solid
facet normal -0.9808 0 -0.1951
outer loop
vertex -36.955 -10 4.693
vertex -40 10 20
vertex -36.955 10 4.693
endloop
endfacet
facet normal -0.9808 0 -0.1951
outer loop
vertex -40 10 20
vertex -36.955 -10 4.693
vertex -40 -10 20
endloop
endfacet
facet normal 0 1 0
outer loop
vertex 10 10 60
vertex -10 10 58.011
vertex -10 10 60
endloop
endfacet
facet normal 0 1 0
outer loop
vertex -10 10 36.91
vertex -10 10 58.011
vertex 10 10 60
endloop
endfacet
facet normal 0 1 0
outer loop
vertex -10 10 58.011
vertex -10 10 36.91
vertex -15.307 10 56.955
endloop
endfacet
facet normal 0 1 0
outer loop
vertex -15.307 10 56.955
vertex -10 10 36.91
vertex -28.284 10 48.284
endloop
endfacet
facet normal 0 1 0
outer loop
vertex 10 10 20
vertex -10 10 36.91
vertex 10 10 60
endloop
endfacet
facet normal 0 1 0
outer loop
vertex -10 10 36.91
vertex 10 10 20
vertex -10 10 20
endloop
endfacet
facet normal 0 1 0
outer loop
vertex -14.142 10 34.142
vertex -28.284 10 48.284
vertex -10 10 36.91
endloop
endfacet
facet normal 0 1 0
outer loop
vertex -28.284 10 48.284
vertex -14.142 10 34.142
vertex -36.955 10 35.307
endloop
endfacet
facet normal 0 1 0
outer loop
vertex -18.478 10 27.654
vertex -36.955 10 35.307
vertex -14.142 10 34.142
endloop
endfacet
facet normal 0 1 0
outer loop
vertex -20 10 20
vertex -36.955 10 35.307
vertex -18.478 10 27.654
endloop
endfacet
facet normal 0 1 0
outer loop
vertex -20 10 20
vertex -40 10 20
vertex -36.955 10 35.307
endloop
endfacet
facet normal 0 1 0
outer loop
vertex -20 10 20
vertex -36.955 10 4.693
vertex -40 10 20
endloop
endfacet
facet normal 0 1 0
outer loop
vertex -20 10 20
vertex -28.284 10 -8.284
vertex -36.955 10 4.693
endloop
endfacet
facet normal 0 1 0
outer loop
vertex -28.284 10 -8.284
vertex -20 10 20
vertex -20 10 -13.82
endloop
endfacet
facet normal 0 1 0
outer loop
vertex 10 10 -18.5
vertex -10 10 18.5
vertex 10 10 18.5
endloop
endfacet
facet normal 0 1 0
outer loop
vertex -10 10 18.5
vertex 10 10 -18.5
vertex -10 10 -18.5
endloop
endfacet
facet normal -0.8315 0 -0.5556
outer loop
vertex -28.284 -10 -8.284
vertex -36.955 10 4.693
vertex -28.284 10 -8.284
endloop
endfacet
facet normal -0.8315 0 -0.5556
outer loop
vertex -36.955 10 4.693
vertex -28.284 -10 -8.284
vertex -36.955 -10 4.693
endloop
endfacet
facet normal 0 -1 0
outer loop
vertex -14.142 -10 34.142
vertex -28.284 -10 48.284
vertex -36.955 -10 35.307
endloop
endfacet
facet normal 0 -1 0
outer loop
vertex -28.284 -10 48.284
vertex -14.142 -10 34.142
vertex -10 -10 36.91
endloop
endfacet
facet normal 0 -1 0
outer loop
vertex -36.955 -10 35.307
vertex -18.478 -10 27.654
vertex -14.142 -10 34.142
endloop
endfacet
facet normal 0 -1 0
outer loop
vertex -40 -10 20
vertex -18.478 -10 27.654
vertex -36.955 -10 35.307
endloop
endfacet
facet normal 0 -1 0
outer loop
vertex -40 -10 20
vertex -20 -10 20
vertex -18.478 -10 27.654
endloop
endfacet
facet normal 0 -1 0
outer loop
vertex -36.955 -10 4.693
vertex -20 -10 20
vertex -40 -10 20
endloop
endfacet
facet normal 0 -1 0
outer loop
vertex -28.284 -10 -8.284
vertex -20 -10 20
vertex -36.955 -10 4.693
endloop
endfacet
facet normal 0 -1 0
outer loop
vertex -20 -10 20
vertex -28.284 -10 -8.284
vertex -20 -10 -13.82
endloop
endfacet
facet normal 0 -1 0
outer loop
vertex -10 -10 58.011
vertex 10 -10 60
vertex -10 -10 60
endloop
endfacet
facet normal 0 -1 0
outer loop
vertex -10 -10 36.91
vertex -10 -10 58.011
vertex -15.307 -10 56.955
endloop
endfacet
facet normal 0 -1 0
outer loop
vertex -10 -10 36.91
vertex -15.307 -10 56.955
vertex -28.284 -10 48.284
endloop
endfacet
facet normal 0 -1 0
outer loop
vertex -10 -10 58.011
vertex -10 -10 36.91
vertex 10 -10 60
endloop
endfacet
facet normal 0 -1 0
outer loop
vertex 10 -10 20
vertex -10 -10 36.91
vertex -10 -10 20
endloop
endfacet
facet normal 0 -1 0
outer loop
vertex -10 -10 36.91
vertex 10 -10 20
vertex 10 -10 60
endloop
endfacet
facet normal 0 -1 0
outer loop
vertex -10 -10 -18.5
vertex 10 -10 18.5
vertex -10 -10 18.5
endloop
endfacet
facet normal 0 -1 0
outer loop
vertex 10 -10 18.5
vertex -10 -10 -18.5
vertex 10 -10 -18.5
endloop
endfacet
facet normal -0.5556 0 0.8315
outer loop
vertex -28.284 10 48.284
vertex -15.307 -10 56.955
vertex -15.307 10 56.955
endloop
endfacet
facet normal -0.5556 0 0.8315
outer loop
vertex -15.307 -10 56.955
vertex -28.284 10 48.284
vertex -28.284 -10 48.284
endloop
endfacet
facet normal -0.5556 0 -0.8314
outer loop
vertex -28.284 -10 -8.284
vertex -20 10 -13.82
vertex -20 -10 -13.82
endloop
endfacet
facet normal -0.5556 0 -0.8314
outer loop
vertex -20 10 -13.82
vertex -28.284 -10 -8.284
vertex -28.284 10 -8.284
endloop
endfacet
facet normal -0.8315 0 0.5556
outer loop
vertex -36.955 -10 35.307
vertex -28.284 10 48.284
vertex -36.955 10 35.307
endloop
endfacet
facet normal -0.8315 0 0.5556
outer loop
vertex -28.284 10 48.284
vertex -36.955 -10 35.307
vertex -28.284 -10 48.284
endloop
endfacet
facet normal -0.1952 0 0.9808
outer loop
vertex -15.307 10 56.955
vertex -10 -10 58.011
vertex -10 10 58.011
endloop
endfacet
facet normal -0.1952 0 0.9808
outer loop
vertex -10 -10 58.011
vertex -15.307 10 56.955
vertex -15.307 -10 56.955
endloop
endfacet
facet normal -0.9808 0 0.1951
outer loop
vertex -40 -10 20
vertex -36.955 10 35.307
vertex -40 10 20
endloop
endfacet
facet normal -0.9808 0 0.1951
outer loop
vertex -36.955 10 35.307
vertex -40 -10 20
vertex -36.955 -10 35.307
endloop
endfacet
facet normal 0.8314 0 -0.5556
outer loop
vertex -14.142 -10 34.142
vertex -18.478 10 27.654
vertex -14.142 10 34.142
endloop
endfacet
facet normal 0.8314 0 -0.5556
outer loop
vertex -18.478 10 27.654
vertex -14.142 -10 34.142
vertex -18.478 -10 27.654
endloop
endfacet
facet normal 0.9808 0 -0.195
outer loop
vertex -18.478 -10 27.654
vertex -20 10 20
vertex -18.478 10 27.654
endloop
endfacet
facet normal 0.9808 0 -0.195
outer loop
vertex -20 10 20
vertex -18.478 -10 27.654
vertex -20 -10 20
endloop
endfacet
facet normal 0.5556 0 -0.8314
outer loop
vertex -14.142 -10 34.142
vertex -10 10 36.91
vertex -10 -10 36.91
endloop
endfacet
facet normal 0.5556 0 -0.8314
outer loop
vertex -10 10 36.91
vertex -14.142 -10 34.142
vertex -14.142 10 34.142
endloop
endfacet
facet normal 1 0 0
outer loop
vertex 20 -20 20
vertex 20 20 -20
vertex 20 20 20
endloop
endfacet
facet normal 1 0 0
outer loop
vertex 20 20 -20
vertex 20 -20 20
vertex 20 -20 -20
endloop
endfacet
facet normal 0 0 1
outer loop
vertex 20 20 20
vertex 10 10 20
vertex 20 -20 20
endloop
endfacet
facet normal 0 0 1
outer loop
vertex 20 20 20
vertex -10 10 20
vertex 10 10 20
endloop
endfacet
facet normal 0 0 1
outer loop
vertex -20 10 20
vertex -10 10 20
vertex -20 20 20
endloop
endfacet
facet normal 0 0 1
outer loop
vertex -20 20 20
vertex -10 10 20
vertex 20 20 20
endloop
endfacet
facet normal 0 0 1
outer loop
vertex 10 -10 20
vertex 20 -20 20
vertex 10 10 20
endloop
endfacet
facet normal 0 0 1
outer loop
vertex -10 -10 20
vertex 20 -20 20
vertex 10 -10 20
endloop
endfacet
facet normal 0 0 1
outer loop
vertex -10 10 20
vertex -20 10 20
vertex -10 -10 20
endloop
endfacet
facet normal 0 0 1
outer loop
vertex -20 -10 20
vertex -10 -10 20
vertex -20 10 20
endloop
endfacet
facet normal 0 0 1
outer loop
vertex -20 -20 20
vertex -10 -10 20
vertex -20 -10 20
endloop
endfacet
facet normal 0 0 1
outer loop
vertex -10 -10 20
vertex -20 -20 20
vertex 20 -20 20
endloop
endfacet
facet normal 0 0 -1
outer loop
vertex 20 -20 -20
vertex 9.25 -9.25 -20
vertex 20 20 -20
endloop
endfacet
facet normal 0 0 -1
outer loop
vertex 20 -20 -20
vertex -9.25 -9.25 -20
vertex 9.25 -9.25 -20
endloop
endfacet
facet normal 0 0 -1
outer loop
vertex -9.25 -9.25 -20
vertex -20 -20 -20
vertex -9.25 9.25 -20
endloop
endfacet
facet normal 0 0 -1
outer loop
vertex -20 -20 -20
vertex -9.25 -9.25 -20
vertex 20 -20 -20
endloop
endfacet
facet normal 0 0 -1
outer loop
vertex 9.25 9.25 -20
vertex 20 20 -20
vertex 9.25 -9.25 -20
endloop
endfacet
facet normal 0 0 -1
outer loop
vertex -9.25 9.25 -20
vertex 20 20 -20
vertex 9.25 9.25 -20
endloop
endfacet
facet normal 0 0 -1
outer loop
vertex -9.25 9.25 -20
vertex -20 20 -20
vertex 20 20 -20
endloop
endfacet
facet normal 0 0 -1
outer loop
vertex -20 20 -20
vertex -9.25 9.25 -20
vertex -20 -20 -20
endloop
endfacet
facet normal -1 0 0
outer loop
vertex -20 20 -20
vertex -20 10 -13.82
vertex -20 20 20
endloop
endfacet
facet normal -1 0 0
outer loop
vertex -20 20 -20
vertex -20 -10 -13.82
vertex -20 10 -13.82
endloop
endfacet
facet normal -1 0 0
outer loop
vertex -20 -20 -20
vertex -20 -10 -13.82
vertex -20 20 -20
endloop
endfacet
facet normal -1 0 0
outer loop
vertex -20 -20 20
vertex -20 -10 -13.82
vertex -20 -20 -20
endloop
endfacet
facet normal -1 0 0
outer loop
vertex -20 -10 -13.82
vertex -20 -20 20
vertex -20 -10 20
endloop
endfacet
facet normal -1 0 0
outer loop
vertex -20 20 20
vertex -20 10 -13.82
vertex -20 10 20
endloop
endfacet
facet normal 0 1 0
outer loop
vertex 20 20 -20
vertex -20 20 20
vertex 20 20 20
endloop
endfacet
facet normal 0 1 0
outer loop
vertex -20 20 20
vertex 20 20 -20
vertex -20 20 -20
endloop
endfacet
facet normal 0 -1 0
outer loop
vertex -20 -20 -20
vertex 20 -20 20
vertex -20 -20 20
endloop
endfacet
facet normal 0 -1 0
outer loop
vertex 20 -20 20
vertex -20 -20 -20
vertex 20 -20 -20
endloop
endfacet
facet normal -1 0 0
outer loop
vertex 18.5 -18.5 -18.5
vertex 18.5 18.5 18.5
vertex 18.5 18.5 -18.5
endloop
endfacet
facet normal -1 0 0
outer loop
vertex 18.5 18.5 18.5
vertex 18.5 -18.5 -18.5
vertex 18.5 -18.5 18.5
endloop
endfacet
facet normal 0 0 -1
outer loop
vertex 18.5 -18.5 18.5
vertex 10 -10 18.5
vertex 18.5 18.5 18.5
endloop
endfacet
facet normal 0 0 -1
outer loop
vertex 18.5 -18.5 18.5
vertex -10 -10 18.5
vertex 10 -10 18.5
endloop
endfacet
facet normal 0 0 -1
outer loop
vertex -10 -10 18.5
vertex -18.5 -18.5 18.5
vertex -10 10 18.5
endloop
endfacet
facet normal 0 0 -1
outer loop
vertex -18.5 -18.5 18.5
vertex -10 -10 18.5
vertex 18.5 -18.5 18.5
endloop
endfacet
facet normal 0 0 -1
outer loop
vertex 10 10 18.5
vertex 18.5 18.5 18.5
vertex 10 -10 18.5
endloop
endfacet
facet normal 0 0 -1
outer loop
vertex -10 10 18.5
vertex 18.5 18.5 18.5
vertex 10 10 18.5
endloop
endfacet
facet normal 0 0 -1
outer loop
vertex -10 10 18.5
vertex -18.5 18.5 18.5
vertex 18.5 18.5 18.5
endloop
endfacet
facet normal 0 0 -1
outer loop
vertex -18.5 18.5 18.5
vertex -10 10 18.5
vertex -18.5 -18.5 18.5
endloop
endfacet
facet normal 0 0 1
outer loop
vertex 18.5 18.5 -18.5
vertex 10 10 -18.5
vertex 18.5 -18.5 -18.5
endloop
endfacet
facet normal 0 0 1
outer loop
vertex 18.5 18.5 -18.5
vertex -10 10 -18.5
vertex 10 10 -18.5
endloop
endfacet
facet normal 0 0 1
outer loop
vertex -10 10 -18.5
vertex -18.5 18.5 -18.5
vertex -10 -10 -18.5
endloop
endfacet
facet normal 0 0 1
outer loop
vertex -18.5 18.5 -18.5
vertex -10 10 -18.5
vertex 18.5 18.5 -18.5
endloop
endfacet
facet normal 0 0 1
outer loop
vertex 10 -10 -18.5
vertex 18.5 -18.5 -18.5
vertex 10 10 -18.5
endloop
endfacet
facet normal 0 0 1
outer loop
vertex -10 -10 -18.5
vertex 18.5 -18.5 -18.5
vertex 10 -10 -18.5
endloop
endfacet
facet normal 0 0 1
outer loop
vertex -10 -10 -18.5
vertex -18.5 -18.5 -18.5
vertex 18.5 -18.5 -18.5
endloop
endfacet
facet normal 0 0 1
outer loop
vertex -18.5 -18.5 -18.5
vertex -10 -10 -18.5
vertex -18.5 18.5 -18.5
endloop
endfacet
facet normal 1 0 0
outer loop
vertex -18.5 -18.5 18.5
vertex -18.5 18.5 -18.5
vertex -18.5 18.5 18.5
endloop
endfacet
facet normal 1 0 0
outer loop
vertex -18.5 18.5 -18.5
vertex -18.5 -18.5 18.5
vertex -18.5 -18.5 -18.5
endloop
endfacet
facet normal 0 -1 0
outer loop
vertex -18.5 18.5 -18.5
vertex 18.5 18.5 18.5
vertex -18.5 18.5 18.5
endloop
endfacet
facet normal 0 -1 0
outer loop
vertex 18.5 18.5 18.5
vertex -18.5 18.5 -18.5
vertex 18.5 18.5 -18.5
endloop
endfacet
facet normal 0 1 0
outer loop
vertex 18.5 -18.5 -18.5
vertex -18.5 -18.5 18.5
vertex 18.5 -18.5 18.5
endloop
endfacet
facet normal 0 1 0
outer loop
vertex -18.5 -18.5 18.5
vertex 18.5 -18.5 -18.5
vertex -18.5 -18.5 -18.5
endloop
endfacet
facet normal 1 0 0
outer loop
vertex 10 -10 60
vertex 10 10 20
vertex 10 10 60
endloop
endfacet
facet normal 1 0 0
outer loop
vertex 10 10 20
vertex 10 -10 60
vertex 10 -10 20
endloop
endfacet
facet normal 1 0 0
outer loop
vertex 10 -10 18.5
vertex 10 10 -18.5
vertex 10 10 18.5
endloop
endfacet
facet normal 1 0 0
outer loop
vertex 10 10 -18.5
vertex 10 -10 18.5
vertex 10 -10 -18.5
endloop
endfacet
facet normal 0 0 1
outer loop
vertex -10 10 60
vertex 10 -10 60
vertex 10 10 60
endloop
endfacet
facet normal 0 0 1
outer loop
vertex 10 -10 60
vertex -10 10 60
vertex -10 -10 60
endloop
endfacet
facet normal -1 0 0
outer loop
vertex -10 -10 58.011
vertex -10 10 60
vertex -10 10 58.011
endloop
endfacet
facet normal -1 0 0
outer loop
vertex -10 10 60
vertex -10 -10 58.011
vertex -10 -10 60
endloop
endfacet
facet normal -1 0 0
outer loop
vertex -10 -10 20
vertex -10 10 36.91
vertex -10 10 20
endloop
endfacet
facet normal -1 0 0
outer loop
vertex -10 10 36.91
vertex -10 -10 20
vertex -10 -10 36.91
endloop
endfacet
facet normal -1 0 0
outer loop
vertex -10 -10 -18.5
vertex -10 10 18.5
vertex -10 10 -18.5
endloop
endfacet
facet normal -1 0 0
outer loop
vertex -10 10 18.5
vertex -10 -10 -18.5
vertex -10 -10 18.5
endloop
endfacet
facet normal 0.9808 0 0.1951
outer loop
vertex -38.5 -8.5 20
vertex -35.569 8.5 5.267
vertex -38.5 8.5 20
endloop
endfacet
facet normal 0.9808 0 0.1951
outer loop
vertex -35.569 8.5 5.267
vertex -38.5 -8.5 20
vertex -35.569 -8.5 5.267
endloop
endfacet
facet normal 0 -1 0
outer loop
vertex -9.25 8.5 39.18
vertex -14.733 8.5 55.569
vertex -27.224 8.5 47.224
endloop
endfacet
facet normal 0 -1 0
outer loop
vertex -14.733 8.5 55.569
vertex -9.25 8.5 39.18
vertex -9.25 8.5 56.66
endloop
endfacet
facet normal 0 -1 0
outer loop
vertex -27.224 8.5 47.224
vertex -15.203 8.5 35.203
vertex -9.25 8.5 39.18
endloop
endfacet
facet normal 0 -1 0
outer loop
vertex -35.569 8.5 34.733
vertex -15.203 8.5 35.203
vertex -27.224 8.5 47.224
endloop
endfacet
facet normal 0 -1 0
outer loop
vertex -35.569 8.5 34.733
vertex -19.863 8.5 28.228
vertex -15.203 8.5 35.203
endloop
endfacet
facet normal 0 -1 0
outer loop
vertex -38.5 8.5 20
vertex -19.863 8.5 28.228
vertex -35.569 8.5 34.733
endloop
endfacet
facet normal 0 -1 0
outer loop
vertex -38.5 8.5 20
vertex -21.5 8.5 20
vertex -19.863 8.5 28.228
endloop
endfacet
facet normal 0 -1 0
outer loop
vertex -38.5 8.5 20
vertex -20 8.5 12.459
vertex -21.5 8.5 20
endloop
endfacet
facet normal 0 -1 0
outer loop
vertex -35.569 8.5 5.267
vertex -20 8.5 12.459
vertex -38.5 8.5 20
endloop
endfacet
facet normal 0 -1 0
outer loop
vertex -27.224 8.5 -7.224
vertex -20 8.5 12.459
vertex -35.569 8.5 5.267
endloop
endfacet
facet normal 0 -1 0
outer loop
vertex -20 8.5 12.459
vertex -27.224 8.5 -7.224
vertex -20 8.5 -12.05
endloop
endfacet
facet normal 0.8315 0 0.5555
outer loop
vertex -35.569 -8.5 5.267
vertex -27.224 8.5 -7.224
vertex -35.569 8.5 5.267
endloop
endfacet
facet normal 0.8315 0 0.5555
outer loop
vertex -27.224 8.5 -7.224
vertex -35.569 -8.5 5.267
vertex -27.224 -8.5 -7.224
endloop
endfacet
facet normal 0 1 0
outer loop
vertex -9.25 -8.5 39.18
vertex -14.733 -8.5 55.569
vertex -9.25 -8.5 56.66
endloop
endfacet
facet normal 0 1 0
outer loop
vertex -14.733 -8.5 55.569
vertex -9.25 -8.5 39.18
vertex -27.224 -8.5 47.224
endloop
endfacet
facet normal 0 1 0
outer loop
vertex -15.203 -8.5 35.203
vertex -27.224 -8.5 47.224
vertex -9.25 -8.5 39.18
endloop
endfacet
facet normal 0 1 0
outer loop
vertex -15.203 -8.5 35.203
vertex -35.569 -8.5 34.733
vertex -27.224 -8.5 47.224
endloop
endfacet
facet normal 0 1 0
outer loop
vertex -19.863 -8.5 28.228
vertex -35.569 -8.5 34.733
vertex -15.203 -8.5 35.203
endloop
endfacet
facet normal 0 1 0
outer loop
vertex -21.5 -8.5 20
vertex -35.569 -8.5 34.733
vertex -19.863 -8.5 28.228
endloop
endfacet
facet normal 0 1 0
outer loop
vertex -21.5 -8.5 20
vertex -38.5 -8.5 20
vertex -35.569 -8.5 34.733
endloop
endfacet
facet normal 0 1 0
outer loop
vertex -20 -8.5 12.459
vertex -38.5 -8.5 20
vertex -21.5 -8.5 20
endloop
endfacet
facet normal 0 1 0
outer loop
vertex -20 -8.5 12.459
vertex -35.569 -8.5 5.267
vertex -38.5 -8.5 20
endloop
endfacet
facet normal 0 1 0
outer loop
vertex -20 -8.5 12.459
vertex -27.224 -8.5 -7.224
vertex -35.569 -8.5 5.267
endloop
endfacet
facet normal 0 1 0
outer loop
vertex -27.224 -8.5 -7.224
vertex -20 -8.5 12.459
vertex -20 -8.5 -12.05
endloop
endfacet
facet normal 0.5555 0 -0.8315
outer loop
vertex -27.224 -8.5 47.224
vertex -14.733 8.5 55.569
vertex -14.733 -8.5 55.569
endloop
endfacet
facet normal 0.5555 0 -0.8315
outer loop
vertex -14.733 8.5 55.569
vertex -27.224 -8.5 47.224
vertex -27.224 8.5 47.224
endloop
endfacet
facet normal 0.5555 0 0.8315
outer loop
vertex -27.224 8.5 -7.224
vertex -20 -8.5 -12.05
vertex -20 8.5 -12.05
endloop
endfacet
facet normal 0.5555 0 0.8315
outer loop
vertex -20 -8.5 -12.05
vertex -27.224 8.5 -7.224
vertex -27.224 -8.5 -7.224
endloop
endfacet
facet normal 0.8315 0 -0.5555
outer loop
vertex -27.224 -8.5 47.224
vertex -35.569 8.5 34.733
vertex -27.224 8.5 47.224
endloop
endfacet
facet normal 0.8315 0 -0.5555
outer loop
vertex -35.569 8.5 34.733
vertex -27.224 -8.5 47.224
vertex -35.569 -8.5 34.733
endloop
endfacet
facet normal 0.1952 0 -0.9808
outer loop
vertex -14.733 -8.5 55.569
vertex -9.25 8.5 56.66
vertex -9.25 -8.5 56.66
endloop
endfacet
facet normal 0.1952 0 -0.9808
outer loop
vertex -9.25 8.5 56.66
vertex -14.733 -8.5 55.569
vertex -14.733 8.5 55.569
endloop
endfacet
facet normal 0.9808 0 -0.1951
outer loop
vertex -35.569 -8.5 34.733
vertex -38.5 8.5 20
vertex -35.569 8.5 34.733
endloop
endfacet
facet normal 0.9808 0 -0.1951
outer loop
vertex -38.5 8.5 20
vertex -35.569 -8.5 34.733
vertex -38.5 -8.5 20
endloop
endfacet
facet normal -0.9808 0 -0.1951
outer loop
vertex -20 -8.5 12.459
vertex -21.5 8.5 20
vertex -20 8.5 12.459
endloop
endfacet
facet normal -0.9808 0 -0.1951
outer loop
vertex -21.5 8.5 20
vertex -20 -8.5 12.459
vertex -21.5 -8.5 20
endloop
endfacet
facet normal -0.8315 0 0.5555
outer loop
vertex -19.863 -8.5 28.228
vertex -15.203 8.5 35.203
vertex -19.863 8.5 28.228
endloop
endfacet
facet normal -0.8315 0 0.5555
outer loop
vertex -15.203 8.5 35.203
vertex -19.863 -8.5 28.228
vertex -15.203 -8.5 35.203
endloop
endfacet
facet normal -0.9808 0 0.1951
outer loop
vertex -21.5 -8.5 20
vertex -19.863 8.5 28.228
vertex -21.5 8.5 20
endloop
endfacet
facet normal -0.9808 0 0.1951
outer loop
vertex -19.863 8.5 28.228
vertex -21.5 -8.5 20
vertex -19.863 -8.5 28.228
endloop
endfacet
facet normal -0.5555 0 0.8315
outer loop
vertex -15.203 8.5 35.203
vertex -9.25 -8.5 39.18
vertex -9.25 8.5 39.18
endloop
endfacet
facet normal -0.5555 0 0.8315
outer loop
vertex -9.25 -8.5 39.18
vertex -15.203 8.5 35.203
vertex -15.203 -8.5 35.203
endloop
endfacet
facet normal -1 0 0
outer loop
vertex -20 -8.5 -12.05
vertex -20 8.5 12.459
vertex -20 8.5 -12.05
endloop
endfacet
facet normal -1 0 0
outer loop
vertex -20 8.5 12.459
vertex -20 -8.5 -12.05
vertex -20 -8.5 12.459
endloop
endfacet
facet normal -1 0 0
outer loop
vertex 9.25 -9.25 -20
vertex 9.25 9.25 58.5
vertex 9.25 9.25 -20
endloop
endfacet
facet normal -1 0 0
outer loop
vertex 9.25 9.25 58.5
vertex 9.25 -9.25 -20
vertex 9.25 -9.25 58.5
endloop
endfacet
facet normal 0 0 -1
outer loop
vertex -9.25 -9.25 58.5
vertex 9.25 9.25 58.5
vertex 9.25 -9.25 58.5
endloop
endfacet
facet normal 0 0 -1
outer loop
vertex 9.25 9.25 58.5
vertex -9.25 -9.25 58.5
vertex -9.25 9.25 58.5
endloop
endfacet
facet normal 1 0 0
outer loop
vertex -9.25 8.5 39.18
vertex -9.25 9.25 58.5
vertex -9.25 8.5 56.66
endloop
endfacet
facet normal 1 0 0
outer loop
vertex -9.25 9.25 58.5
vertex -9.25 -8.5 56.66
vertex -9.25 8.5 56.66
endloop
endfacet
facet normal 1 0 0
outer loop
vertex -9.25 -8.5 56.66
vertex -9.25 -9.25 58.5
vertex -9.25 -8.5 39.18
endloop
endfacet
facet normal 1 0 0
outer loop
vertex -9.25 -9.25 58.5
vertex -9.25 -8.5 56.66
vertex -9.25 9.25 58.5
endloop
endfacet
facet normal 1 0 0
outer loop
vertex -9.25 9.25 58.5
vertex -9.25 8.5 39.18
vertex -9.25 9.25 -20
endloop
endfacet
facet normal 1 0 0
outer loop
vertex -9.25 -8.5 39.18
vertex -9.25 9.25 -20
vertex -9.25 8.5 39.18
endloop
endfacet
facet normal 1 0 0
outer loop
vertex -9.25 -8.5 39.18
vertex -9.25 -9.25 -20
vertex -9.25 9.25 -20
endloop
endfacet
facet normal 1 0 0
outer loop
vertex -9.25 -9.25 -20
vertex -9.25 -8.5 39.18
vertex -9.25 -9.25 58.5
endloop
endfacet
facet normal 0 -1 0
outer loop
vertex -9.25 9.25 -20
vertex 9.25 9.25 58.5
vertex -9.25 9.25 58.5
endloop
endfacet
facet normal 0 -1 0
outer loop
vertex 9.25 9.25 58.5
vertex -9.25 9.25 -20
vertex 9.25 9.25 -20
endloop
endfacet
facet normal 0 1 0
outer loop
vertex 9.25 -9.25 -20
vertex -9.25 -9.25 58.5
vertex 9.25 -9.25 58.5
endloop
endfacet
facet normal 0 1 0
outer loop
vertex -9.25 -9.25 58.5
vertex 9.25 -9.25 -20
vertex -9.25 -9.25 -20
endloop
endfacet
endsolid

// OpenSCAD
c = 40;   // Cube size
u = 20;   // Tube size
t = 1.5;  // Thickness
fn = 16;    // Facets

difference()
  {
  union()
    {
    difference()
      {
      union()
        {
        //  Main block/body of bottle
        cube(c,center=true);  
        difference()
          {
          //  Thin wide cylinder, turned on its side to act as handle
          translate([0,0,c/2]) rotate([90,0,0]) cylinder(h=u,r=c,$fn=fn, center=true);
          //  Cut out so that it is kind of a donut shape
          translate([0,0,c/2]) rotate([90,0,0]) cylinder(h=u+1,r=c-u,$fn=fn, center=true);
          //  Cut in half, vertically so that it is essentially a large "C" 
          translate([c+1,0,c/2]) cube(c*2+2, center=true);
          }
        }
      //  Cut out of main block/body
      cube(c-t*2,center=true);
      }
    //  Tall thin neck to block/body - needs to run through middle of bottle
    translate([0,0,c/2]) cube([u,u,c*2],center=true);
    }
  //  Need to include cutout for interior of neck
  translate([0,0,c/2-t]) cube([u-t,u-t,c*2],center=true);
  //  Need to include cutout for interior of handle
  difference()
    {
    //  Thin wide cylinder, turned on its side to act as handle
    translate([0,0,c/2]) rotate([90,0,0]) cylinder(h=u-t*2,r=c-t,$fn=fn, center=true);
    //  Cut out so that it is kind of a donut shape
    translate([0,0,c/2]) rotate([90,0,0]) cylinder(h=u+1-t*2,r=c-u+t,$fn=fn, center=true);
    //  Cut in half, vertically so that it is essentially a large "C"
    translate([c+1,0,c/2]) cube(c*2+2, center=true);
    //  Cut out a little extra so that the C doesn't intersect the neck inside the bottle
    translate([c+1-u,0,-c/2]) cube(c*2+2, center=true);
    }
  }
